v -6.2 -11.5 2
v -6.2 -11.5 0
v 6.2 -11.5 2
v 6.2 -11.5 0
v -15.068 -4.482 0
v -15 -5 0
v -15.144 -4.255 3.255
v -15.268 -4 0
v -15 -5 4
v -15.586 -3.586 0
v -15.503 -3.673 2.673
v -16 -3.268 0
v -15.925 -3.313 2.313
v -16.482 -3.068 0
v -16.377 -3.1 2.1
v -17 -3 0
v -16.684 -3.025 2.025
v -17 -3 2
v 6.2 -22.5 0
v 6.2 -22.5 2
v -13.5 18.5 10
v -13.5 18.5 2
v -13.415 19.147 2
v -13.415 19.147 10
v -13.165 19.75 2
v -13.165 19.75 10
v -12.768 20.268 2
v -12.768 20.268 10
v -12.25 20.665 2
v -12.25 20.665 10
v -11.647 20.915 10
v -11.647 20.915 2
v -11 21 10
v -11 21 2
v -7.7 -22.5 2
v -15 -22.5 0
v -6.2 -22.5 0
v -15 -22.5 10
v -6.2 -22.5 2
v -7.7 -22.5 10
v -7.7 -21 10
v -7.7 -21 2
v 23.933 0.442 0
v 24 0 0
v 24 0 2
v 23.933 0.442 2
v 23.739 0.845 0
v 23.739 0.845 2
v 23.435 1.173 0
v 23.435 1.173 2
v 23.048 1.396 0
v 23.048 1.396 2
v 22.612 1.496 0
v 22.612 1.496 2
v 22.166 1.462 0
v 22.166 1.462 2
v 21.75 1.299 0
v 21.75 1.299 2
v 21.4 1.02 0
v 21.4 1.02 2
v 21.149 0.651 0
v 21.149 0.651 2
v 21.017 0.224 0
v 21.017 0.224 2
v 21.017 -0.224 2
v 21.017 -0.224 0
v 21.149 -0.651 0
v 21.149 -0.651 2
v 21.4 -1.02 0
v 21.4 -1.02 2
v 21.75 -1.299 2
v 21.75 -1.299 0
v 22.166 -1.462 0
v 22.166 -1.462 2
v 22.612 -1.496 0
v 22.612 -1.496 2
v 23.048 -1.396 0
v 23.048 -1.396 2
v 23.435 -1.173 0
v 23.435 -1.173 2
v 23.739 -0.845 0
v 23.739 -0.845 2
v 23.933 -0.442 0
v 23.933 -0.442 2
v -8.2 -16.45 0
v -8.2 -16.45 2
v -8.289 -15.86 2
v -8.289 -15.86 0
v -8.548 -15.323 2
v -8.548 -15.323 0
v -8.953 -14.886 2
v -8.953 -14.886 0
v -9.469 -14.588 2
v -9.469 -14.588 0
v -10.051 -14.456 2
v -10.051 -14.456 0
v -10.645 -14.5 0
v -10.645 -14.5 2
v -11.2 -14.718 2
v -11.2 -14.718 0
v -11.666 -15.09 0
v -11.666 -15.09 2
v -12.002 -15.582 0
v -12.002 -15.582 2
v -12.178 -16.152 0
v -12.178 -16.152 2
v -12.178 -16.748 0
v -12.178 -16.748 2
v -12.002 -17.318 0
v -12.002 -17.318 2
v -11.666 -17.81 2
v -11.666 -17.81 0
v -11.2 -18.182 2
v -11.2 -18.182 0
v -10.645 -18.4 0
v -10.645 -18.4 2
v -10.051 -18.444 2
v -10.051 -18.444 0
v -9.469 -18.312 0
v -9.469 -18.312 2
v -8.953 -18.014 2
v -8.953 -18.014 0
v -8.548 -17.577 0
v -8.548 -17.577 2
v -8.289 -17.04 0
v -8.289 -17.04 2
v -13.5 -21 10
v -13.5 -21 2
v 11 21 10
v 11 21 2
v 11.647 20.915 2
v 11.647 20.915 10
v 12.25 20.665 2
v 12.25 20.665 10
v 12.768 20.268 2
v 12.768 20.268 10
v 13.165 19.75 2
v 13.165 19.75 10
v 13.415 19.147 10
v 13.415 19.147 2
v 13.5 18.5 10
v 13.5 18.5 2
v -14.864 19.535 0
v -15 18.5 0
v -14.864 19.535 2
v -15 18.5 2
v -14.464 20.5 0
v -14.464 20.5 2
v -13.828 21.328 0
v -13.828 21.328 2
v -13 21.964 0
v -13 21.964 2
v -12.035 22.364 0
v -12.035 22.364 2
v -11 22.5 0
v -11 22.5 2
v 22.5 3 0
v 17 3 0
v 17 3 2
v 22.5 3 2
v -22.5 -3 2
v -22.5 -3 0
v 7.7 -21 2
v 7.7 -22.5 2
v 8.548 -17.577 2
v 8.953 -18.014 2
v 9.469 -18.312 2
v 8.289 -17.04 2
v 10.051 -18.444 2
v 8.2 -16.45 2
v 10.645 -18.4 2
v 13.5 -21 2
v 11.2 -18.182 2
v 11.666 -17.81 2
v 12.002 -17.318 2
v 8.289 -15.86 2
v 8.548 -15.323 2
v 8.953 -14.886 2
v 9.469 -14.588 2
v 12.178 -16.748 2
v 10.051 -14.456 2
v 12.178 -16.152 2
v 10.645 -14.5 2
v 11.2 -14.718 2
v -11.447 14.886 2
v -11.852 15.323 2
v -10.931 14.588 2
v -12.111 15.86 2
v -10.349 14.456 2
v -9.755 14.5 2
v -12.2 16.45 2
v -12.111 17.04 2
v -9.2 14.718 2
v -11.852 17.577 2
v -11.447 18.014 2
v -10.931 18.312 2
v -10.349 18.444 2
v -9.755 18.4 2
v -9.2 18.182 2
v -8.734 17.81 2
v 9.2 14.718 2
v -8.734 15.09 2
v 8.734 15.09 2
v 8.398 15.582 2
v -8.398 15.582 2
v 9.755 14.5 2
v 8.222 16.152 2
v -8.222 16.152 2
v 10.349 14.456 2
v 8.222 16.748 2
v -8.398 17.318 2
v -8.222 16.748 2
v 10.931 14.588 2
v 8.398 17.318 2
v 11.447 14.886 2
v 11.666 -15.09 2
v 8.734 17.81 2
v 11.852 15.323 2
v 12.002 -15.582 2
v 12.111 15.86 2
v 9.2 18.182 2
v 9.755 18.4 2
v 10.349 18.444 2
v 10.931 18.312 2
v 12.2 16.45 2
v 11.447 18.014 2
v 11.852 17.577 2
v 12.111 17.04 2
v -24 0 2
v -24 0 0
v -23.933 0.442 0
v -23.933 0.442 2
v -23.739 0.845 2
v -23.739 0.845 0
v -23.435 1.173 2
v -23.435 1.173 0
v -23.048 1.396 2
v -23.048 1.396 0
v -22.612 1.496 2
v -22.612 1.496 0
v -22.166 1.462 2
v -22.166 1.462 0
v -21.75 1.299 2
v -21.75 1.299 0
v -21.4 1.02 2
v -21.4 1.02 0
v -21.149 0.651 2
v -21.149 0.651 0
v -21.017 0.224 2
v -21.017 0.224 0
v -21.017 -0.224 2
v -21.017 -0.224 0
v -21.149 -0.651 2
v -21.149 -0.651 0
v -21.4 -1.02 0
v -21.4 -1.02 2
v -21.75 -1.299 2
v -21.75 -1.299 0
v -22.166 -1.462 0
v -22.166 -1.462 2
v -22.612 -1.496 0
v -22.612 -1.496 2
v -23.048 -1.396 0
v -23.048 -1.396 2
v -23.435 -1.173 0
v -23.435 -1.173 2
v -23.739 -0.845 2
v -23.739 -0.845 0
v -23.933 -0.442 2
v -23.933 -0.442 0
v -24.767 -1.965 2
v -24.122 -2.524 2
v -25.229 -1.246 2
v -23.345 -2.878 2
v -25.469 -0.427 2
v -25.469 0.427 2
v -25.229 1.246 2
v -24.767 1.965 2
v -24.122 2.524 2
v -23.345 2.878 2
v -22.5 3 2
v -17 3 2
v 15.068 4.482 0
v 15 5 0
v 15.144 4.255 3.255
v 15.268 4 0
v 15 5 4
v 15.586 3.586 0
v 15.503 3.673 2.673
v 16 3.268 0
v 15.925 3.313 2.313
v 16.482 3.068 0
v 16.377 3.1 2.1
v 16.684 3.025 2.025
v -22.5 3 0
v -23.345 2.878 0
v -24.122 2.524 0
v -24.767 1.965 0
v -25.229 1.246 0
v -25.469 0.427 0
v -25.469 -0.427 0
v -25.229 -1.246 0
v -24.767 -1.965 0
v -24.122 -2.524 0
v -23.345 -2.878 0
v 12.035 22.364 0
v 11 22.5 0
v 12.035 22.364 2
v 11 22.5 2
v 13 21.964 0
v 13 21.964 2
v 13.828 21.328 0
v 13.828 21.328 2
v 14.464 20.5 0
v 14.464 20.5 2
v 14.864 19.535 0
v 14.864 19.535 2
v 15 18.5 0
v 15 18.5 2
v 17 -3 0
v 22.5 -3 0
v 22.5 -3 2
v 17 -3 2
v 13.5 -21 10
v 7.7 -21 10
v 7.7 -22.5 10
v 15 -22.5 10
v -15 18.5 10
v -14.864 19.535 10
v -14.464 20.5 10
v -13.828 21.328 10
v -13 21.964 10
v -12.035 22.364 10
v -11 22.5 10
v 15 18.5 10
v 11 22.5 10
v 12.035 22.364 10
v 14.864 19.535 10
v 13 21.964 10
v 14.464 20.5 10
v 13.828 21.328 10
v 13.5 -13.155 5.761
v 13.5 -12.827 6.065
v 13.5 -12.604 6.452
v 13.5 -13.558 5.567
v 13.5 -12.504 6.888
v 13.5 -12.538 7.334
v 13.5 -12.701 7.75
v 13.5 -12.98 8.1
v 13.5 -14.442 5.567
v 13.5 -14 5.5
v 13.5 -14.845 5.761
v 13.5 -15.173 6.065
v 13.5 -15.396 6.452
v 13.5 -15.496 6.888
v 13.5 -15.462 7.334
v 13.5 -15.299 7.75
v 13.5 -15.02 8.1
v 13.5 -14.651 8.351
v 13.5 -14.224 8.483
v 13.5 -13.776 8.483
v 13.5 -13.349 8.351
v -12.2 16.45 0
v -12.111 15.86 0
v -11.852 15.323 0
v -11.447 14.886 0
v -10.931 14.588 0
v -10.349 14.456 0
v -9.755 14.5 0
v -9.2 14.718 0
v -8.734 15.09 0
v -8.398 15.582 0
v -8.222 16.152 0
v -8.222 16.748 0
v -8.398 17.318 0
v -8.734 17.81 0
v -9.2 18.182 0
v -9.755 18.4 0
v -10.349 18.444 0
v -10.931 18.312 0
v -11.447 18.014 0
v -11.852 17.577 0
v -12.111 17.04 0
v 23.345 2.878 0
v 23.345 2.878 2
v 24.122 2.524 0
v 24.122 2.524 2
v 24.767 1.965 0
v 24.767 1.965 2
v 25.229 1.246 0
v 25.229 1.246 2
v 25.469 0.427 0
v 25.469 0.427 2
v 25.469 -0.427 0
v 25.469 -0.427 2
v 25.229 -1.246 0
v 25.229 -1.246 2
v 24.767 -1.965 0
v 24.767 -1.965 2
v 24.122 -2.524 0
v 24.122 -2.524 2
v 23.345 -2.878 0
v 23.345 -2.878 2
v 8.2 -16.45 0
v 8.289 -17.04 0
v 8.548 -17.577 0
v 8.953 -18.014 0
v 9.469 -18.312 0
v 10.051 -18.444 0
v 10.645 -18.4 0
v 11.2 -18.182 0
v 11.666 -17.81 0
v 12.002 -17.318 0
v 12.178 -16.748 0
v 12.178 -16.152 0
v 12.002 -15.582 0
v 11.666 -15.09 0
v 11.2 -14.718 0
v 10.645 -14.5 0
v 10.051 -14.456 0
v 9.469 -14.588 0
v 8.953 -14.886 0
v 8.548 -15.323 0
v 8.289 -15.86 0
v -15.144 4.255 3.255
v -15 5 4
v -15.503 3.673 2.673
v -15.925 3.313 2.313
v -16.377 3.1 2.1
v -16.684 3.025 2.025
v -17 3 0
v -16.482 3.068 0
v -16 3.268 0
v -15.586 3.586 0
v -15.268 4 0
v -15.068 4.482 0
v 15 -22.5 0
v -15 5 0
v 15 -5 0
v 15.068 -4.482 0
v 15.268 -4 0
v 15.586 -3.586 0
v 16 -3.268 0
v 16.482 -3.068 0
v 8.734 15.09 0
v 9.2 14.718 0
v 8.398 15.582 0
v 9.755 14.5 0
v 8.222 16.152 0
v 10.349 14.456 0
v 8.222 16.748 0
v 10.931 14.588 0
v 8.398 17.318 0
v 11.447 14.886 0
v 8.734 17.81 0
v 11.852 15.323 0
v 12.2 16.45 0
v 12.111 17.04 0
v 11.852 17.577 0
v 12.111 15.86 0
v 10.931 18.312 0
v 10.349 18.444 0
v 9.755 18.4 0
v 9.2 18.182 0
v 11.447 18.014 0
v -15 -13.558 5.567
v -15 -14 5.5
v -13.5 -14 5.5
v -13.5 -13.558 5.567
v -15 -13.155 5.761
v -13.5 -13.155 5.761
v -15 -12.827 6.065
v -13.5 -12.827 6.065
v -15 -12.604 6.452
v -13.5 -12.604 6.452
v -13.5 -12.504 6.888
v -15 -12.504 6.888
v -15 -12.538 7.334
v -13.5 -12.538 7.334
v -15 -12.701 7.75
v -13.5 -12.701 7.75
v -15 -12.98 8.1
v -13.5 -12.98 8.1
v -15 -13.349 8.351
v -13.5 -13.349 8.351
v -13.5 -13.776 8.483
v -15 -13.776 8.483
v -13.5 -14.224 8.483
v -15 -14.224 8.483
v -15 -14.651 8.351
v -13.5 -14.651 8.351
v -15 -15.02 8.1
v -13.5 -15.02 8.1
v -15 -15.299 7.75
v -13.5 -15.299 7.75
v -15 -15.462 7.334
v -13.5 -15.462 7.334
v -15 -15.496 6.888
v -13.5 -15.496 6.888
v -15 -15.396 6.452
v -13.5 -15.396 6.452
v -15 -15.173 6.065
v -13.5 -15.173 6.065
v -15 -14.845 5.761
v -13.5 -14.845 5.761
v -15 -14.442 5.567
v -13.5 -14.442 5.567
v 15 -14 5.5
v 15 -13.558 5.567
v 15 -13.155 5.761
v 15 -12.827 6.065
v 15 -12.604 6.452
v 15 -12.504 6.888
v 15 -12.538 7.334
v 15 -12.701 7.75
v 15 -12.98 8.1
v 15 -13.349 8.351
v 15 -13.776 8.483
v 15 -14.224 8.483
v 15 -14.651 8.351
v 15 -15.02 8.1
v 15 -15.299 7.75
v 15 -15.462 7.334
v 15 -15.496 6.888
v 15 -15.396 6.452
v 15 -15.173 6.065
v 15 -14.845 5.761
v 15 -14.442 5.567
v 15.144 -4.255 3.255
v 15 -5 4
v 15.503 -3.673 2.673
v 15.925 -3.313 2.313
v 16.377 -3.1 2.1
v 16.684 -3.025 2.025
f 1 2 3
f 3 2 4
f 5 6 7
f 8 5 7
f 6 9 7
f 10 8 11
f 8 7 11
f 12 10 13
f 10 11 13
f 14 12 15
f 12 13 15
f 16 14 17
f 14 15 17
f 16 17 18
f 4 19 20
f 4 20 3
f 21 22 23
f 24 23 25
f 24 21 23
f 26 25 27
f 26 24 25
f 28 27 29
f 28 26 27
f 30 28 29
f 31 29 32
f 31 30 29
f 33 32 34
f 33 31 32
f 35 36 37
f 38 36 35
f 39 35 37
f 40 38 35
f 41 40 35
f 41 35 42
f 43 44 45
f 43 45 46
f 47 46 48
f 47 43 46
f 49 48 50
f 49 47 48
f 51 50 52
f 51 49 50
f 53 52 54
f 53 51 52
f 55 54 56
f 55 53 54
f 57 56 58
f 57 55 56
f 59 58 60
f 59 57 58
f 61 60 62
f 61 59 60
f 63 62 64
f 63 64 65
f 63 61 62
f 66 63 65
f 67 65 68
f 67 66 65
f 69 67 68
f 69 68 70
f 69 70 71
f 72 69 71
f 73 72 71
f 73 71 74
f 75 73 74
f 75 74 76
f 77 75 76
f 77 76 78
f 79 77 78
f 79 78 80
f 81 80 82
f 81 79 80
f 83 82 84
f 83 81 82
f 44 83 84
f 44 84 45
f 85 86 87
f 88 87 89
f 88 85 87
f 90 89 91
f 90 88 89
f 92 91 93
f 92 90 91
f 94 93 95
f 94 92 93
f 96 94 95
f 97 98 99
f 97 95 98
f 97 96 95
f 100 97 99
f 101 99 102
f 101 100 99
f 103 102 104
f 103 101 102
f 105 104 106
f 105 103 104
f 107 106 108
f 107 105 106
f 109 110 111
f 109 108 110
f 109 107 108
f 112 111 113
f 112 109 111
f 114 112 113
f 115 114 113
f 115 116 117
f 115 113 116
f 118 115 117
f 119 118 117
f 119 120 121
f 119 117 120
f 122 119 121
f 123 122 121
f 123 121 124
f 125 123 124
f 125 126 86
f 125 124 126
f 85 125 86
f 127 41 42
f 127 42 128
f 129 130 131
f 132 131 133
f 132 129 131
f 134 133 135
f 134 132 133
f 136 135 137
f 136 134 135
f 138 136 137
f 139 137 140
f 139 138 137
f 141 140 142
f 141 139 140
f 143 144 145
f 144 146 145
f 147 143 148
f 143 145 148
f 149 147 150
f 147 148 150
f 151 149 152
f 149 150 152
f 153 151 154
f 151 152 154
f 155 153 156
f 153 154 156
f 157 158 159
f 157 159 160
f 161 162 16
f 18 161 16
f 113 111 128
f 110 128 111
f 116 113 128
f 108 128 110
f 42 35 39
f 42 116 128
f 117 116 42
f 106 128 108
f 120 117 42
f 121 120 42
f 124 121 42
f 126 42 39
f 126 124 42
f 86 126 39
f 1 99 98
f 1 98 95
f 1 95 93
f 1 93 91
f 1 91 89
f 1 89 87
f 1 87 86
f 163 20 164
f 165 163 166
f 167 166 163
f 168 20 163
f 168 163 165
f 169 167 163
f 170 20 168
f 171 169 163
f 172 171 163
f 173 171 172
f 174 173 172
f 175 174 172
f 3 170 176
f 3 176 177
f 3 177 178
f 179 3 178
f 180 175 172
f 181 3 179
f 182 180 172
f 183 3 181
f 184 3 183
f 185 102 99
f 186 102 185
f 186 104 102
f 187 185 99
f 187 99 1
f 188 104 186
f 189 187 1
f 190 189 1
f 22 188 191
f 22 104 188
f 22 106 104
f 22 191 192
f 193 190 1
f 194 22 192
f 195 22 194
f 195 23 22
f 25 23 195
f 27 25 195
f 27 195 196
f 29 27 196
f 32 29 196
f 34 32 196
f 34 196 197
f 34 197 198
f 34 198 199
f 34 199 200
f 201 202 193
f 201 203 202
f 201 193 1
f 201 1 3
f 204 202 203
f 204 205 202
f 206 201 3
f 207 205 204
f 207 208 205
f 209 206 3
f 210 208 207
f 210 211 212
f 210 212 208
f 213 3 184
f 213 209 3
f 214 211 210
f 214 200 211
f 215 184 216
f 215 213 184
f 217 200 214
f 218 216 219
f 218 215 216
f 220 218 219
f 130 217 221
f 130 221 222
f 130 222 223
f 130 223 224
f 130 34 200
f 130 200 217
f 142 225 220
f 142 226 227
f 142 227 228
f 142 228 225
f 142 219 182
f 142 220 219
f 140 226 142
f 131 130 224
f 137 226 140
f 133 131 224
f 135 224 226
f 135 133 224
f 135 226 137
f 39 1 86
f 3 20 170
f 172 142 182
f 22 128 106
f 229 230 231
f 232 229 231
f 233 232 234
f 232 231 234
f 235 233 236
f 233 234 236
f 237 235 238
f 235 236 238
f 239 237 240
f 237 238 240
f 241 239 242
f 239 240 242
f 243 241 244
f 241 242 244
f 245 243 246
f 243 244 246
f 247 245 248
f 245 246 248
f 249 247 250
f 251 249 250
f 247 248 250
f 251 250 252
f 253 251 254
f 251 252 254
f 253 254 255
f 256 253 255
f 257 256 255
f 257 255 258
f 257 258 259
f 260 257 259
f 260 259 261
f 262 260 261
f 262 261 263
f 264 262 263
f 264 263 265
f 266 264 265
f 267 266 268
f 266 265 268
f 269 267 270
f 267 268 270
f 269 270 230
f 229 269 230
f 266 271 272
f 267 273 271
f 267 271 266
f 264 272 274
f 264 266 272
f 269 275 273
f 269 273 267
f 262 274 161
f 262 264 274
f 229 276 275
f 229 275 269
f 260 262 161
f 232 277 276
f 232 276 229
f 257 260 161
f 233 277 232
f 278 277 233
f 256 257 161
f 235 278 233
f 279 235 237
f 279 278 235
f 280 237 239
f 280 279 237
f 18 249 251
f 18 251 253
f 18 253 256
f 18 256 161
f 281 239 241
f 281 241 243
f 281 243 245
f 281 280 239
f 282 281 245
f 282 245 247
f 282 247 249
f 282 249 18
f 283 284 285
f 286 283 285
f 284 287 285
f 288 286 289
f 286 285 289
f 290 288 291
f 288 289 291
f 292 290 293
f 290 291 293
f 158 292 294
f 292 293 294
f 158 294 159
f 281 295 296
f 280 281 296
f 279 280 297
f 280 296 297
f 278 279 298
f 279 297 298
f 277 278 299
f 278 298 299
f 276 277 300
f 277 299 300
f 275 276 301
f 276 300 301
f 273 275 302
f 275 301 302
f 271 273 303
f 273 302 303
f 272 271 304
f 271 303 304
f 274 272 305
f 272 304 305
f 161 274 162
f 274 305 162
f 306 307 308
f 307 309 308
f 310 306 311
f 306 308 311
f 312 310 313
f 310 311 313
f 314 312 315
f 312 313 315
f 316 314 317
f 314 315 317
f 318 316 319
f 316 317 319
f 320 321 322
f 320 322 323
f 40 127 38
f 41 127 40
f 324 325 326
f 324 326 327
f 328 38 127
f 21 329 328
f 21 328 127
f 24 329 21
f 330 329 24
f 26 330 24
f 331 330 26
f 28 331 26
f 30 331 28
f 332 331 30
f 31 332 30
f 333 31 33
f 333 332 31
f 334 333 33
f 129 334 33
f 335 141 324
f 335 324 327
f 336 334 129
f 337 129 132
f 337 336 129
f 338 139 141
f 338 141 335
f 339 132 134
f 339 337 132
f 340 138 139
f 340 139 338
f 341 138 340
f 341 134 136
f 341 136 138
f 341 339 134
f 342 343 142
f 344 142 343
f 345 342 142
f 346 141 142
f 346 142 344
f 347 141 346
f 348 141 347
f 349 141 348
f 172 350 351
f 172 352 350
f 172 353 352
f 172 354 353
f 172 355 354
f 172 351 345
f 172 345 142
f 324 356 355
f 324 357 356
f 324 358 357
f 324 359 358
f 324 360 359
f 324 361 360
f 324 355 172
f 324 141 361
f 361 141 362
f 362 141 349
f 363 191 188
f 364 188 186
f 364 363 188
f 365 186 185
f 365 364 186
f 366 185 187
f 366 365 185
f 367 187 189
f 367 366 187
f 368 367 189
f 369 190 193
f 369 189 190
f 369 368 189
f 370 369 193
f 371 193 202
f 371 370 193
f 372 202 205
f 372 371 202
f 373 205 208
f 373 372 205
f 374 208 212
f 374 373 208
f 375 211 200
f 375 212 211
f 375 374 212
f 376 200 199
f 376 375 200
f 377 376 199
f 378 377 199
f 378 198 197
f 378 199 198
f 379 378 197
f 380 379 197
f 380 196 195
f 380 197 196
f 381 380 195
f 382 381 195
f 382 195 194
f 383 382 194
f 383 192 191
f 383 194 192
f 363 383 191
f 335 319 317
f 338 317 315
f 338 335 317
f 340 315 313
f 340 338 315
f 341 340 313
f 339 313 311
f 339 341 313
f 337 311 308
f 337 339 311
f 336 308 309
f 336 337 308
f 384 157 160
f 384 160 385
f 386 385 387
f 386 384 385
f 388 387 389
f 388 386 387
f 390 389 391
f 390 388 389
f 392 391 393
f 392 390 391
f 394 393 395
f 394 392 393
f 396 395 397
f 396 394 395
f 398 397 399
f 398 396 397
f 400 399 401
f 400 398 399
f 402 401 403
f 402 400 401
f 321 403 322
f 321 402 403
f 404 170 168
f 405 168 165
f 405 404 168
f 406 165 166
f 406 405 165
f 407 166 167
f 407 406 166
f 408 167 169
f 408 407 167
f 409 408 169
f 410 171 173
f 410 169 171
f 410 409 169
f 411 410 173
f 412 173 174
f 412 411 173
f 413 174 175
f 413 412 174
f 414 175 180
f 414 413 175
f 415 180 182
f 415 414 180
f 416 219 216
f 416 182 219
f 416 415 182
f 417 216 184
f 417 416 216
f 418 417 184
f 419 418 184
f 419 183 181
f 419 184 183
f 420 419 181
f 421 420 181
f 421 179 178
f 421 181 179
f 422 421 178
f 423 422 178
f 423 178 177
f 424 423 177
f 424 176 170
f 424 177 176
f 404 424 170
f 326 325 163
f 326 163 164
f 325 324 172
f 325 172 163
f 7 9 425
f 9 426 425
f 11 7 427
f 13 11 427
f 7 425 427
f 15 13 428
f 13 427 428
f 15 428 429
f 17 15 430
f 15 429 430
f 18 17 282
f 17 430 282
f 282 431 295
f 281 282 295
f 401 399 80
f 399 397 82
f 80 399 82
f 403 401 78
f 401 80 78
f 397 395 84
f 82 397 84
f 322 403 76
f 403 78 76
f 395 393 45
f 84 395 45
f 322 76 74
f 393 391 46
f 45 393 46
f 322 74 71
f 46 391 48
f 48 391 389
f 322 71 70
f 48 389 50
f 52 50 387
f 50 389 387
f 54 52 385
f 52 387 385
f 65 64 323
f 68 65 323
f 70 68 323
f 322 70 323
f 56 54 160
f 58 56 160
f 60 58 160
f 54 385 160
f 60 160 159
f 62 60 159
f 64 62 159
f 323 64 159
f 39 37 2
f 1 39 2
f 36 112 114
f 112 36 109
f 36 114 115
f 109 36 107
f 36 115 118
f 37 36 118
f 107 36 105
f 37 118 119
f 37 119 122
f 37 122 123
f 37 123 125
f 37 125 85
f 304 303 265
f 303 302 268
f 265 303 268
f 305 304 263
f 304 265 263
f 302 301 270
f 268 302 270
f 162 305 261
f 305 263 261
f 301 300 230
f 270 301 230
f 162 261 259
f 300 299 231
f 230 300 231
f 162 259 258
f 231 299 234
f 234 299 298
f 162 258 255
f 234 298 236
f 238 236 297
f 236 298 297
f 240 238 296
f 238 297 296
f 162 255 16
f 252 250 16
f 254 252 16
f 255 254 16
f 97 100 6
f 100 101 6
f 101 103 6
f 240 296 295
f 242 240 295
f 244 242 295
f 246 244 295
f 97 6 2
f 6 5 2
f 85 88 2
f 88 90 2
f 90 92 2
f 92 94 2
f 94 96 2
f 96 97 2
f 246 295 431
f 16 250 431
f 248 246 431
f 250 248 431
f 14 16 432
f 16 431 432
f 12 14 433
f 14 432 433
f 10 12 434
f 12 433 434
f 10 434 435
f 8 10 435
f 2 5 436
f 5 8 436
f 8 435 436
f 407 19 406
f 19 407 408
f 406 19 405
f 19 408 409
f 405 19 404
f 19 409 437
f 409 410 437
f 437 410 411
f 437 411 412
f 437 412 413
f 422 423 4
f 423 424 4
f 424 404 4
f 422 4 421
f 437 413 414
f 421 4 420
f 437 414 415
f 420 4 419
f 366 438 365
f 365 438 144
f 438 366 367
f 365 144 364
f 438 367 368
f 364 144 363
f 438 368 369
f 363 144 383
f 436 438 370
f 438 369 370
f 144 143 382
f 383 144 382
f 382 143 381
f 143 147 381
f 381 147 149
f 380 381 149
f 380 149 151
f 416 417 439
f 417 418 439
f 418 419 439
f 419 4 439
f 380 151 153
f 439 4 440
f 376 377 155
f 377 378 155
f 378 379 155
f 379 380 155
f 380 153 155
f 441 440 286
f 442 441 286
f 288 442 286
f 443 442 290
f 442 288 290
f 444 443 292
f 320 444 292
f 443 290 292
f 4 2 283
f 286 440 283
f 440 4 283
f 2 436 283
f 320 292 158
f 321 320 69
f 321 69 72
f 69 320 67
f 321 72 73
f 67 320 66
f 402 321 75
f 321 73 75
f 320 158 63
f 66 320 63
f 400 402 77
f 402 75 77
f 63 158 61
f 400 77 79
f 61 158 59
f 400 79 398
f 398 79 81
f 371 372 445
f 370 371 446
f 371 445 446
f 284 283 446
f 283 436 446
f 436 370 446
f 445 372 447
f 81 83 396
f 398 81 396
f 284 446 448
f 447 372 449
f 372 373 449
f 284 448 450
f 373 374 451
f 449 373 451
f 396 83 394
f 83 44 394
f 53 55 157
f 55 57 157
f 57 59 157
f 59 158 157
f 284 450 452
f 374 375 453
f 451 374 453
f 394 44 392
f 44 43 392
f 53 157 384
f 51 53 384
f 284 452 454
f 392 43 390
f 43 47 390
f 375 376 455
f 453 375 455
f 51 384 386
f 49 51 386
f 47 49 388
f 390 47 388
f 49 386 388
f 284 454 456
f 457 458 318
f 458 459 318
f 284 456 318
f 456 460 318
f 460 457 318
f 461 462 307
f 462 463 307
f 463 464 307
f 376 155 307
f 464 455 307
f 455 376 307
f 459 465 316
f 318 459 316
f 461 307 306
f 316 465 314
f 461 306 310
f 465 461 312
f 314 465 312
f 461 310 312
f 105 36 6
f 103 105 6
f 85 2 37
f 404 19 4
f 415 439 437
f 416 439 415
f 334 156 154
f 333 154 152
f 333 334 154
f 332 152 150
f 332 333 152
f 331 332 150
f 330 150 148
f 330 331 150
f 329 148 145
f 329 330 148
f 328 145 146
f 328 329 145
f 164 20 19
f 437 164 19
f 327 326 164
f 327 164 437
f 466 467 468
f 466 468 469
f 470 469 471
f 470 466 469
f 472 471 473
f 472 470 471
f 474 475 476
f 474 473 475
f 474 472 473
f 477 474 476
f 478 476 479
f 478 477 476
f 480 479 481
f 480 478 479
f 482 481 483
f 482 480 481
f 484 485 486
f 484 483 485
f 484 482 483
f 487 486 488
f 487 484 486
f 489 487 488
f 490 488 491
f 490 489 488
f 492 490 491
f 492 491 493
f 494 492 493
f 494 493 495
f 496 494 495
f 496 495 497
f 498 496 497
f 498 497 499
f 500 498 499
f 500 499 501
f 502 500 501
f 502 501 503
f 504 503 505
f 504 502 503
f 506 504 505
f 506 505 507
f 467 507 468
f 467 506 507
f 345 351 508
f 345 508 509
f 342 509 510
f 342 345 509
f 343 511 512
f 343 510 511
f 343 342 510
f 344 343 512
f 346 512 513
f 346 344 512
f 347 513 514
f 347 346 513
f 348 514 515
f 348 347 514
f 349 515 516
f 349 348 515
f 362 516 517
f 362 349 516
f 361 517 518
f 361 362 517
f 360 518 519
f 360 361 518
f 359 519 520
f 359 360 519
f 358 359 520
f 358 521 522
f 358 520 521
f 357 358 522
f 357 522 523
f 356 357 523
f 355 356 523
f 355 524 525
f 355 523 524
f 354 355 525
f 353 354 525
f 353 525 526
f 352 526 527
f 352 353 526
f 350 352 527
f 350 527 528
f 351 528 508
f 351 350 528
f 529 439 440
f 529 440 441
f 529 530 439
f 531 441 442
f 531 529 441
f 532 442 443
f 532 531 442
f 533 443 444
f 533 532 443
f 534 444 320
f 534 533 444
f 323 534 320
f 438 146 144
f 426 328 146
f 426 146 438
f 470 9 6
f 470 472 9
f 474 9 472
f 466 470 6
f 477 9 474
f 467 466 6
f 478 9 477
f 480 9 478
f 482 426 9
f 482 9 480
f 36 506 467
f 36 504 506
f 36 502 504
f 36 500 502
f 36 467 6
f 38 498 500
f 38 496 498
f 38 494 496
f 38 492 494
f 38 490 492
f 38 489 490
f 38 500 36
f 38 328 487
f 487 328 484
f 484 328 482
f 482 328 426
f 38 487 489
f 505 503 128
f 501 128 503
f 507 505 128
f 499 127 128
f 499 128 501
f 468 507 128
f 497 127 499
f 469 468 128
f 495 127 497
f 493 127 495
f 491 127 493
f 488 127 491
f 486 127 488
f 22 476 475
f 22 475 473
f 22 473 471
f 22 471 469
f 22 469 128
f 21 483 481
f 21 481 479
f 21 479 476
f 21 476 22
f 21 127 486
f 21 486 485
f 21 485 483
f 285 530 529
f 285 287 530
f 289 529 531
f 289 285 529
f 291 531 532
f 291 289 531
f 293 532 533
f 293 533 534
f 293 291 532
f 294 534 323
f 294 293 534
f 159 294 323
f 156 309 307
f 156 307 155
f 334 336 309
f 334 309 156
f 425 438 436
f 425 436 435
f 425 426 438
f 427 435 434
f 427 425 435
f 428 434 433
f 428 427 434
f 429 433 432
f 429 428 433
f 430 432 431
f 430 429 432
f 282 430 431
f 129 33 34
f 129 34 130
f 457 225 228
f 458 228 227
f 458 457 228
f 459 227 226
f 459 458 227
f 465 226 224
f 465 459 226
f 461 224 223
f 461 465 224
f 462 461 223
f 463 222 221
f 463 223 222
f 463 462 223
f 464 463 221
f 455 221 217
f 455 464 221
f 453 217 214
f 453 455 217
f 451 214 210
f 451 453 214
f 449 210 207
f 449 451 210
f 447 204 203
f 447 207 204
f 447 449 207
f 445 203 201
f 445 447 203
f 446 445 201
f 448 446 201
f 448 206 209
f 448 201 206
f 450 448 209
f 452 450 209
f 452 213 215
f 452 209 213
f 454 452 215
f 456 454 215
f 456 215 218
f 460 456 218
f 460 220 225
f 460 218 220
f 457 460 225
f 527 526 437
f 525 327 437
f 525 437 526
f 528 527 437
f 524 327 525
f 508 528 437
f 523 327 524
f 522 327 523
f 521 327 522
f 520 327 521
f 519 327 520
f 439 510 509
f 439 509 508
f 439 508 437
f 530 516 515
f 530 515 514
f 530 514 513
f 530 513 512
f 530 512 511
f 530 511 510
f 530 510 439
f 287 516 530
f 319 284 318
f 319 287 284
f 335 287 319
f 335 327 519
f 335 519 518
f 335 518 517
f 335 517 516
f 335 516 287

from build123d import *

# Parameters (mm, degrees)
ESQUISSE1_W                  = 30
ESQUISSE1_H                  = 45
BOSS_EXTRU_1_DEPTH           = 2
ESQUISSE3_R                  = 2
ESQUISSE3_W                  = 12.4
ESQUISSE3_H                  = 11
ENL_V_MAT_EXTRU_1_DEPTH      = 28.115494
CONG_1_R                     = 4
BOSS_EXTRU_2_START           = 10
BOSS_EXTRU_2_DEPTH           = 10
ENL_V_MAT_EXTRU_2_DEPTH      = 29.831406
ENL_V_MAT_EXTRU_2_DEPTH_BACK = 29.831406
ESQUISSE7_R                  = 1.5
ESQUISSE10_R                 = 1.5
BOSS_EXTRU_3_DEPTH           = 2
CONG_2_R                     = 2
CONG_3_R                     = 2


with BuildPart() as part:
    # Esquisse1 → Boss.-Extru.1 (new body)
    with BuildSketch(Plane.XY):
        Rectangle(ESQUISSE1_W, ESQUISSE1_H)
    extrude(amount=BOSS_EXTRU_1_DEPTH)

    # Esquisse3 → Enlèv. mat.-Extru.1 (cut, through all)
    with BuildSketch(Plane.XY):
        with Locations((10.2, 16.45)):
            Circle(ESQUISSE3_R)
        with Locations(Location((-10.2, 16.45, 0), (0, 0, 180))):
            Circle(ESQUISSE3_R)
        with Locations((-10.2, -16.45)):
            Circle(ESQUISSE3_R)
        with Locations(Location((10.2, -16.45, 0), (0, 0, 180))):
            Circle(ESQUISSE3_R)
        with Locations((0, -17)):
            Rectangle(ESQUISSE3_W, ESQUISSE3_H)
    extrude(amount=ENL_V_MAT_EXTRU_1_DEPTH, mode=Mode.SUBTRACT)

    # Congé1
    cong_1_edges = [part.edges().sort_by_distance(p)[0] for p in [
        (-15, 22.5, 1),
        (15, 22.5, 1),
    ]]
    fillet(cong_1_edges, radius=CONG_1_R)

    # Esquisse6 → Boss.-Extru.2 (add)
    with BuildSketch(Plane.XY.offset(BOSS_EXTRU_2_START)):
        with BuildLine():
            Line((7.7, -21), (7.7, -22.5))
            Line((7.7, -22.5), (15, -22.5))
            Line((15, -22.5), (15, 18.5))
            ThreePointArc((15, 18.5), (13.828427, 21.328427), (11, 22.5))
            Line((11, 22.5), (-11, 22.5))
            ThreePointArc((-11, 22.5), (-13.828427, 21.328427), (-15, 18.5))
            Line((-15, 18.5), (-15, -22.5))
            Line((-15, -22.5), (-7.7, -22.5))
            Line((-7.7, -22.5), (-7.7, -21))
            Line((-7.7, -21), (-13.5, -21))
            Line((-13.5, -21), (-13.5, 18.5))
            ThreePointArc((-13.5, 18.5), (-12.767767, 20.267767), (-11, 21))
            Line((-11, 21), (11, 21))
            ThreePointArc((11, 21), (12.767767, 20.267767), (13.5, 18.5))
            Line((13.5, 18.5), (13.5, -21))
            Line((13.5, -21), (7.7, -21))
        make_face()
    extrude(amount=-BOSS_EXTRU_2_DEPTH)

    # Esquisse7 → Enlèv. mat.-Extru.2 (cut, two sides: drawn at the far end of the back side and taken through both)
    with BuildSketch(Plane(origin=(0, 0, 0), x_dir=(0, 0, -1), z_dir=(1, 0, 0)).offset(-ENL_V_MAT_EXTRU_2_DEPTH_BACK)):
        with Locations((-7, -14)):
            Circle(ESQUISSE7_R)
    extrude(amount=ENL_V_MAT_EXTRU_2_DEPTH + ENL_V_MAT_EXTRU_2_DEPTH_BACK, mode=Mode.SUBTRACT)

    # Esquisse10 → Boss.-Extru.3 (add)
    with BuildSketch(Plane.XY):
        with BuildLine():
            Line((15, 3), (22.5, 3))
            ThreePointArc((22.5, 3), (25.5, 0), (22.5, -3))
            Line((22.5, -3), (15, -3))
            Line((15, -3), (15, 3))
        make_face()
        with Locations((22.5, 0)):
            Circle(ESQUISSE10_R, mode=Mode.SUBTRACT)
    boss_extru_3 = extrude(amount=BOSS_EXTRU_3_DEPTH)

    # Congé2
    cong_2_edges = [part.edges().sort_by_distance(p)[0] for p in [
        (15, 0, 2),
        (15, 3, 1),
        (15, -3, 1),
    ]]
    fillet(cong_2_edges, radius=CONG_2_R)

    # Symétrie2: Boss.-Extru.3 across plane
    add(boss_extru_3.mirror(Plane(origin=(0, 0, 0), x_dir=(0, 0, 1), z_dir=(1, 0, 0))))

    # Congé3
    cong_3_edges = [part.edges().sort_by_distance(p)[0] for p in [
        (-15, 0, 2),
        (-15, -3, 1),
        (-15, 3, 1),
    ]]
    fillet(cong_3_edges, radius=CONG_3_R)


solid = part.part
